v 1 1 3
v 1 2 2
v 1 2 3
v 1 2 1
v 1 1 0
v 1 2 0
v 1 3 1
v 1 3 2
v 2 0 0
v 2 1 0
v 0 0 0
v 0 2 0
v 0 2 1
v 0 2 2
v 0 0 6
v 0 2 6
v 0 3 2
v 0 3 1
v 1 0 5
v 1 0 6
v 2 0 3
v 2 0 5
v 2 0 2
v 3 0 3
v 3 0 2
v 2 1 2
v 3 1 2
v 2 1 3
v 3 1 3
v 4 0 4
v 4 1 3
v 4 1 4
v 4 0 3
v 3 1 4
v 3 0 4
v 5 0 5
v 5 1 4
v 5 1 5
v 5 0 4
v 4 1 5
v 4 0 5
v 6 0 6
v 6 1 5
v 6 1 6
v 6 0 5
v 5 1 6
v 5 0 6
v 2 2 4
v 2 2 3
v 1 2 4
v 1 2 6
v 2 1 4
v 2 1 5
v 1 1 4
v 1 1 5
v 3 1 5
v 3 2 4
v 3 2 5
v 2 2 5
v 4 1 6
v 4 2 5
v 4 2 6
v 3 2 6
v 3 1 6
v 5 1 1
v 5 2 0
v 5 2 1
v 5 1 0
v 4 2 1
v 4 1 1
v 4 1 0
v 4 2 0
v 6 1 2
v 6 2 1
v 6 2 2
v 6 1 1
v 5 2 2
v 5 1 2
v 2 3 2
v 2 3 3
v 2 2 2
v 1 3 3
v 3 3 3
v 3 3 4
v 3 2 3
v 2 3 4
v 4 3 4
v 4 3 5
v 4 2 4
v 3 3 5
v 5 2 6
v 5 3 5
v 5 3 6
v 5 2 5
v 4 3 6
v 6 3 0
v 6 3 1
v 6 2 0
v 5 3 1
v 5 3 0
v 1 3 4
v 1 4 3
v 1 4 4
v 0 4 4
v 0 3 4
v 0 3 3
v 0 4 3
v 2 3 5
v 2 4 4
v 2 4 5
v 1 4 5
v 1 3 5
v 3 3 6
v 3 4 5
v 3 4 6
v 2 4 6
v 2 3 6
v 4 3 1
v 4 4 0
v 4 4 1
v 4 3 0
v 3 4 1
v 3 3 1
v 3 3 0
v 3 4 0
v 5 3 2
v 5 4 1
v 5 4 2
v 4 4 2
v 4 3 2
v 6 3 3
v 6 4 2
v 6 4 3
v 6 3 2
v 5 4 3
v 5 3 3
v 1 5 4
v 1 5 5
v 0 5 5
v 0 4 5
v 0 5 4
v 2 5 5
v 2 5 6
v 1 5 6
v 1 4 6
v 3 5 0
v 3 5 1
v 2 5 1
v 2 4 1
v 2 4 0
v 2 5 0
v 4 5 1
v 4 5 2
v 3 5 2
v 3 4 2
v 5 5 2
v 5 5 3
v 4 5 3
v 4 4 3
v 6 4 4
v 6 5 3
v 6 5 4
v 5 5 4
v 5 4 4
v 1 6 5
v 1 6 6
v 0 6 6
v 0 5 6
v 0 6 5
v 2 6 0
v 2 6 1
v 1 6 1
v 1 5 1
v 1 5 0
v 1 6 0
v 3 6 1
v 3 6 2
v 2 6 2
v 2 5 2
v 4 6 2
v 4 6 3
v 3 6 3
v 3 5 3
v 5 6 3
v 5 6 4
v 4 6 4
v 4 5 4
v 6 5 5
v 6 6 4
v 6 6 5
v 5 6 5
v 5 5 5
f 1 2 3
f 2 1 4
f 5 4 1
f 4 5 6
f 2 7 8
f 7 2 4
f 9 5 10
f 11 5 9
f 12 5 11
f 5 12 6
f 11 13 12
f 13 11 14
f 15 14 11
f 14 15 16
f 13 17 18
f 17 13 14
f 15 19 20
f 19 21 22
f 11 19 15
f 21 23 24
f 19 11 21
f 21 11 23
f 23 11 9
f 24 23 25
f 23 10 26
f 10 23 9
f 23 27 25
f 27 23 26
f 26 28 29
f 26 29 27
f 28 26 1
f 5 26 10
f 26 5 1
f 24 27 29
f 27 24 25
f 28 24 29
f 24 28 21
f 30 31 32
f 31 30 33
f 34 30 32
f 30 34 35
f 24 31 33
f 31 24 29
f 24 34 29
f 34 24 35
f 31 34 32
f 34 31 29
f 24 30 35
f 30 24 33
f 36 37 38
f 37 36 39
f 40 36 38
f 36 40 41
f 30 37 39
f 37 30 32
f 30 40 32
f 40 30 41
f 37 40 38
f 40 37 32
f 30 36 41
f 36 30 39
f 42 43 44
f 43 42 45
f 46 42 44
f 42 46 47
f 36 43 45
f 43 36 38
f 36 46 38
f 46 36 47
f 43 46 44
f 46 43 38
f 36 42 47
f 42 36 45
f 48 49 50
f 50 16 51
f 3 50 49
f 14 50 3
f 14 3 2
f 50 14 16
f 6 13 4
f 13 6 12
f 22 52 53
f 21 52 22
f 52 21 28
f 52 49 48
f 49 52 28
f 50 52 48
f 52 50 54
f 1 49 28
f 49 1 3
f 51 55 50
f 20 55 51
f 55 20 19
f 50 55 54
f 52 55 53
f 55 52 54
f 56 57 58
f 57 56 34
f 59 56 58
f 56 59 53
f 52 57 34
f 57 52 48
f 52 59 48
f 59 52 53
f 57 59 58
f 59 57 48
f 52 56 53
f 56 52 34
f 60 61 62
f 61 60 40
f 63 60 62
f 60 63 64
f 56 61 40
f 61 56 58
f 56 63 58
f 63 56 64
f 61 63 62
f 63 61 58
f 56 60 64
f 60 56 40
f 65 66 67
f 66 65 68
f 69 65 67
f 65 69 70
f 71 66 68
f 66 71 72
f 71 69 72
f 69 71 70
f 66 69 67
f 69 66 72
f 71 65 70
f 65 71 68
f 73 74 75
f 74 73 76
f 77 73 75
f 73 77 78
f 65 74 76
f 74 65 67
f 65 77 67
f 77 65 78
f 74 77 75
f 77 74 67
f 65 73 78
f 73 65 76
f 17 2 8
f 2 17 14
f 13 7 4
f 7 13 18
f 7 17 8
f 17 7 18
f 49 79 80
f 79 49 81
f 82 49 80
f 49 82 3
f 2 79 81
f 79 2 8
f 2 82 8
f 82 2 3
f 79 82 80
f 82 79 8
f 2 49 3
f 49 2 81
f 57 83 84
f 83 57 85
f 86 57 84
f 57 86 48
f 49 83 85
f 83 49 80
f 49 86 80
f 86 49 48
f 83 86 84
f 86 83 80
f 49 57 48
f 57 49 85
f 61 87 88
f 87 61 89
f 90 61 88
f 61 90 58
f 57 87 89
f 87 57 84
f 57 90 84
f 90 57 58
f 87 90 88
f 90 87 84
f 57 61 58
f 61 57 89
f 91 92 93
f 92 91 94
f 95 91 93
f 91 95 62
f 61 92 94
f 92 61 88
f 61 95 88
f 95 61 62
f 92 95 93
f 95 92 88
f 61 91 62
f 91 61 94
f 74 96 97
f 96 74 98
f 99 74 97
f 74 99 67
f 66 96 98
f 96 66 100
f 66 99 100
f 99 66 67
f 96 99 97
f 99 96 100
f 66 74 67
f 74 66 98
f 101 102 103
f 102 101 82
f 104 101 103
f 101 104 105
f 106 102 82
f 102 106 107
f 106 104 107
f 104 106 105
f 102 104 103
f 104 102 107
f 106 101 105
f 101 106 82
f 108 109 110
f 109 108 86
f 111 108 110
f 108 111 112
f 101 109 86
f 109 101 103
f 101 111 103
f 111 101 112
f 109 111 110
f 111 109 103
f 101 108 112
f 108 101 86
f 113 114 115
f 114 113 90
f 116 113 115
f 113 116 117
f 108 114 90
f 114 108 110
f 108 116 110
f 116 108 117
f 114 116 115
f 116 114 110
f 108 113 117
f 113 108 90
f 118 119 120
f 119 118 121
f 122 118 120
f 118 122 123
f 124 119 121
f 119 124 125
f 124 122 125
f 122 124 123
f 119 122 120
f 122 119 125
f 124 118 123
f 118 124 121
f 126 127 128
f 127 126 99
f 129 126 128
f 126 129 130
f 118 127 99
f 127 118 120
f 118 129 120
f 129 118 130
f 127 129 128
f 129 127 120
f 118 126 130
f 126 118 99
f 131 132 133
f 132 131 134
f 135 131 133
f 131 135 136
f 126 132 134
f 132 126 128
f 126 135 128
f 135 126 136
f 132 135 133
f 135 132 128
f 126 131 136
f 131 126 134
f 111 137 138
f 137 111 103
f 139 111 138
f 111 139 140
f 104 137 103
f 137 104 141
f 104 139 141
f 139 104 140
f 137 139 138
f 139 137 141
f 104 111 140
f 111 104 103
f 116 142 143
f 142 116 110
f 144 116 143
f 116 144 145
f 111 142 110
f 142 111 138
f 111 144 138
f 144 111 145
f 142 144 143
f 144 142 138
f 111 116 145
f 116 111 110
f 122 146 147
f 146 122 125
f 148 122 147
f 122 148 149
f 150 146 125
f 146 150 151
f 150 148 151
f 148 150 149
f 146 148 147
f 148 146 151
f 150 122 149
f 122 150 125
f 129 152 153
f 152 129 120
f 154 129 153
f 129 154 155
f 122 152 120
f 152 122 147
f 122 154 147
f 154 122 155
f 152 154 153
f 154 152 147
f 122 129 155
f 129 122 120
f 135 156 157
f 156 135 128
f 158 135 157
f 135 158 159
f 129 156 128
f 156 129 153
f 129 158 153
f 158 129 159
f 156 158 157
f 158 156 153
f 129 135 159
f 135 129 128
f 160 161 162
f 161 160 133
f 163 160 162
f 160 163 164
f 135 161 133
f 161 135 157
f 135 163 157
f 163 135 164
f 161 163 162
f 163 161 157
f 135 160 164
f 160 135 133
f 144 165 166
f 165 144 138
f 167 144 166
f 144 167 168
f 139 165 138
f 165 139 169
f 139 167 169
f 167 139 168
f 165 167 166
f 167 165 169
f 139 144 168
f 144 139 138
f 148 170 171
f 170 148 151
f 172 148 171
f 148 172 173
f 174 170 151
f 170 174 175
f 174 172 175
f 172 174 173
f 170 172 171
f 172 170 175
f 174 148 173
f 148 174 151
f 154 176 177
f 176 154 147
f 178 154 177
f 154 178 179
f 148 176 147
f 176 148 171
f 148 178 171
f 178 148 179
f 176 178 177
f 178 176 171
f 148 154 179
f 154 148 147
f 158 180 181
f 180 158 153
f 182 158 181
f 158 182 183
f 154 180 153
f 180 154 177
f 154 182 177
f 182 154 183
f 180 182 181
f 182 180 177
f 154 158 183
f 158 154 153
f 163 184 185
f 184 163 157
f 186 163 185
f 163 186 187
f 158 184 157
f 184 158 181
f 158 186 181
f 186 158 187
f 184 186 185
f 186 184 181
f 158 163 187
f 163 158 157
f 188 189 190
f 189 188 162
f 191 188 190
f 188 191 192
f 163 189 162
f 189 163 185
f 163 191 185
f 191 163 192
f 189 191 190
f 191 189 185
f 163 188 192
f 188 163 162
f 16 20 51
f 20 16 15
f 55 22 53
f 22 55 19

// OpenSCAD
union() {
    translate([0, 0, 0]) cube([1, 1, 1]);
    translate([1, 0, 1]) cube([1, 1, 1]);
    translate([2, 0, 2]) cube([1, 1, 1]);
    translate([3, 0, 3]) cube([1, 1, 1]);
    translate([4, 0, 4]) cube([1, 1, 1]);
    translate([5, 0, 5]) cube([1, 1, 1]);
    translate([0, 1, 2]) cube([1, 1, 1]);
    translate([1, 1, 3]) cube([1, 1, 1]);
    translate([2, 1, 4]) cube([1, 1, 1]);
    translate([3, 1, 5]) cube([1, 1, 1]);
    translate([4, 1, 0]) cube([1, 1, 1]);
    translate([5, 1, 1]) cube([1, 1, 1]);
    translate([0, 2, 1]) cube([1, 1, 1]);
    translate([1, 2, 2]) cube([1, 1, 1]);
    translate([2, 2, 3]) cube([1, 1, 1]);
    translate([3, 2, 4]) cube([1, 1, 1]);
    translate([4, 2, 5]) cube([1, 1, 1]);
    translate([5, 2, 0]) cube([1, 1, 1]);
    translate([0, 3, 3]) cube([1, 1, 1]);
    translate([1, 3, 4]) cube([1, 1, 1]);
    translate([2, 3, 5]) cube([1, 1, 1]);
    translate([3, 3, 0]) cube([1, 1, 1]);
    translate([4, 3, 1]) cube([1, 1, 1]);
    translate([5, 3, 2]) cube([1, 1, 1]);
    translate([0, 4, 4]) cube([1, 1, 1]);
    translate([1, 4, 5]) cube([1, 1, 1]);
    translate([2, 4, 0]) cube([1, 1, 1]);
    translate([3, 4, 1]) cube([1, 1, 1]);
    translate([4, 4, 2]) cube([1, 1, 1]);
    translate([5, 4, 3]) cube([1, 1, 1]);
    translate([0, 5, 5]) cube([1, 1, 1]);
    translate([1, 5, 0]) cube([1, 1, 1]);
    translate([2, 5, 1]) cube([1, 1, 1]);
    translate([3, 5, 2]) cube([1, 1, 1]);
    translate([4, 5, 3]) cube([1, 1, 1]);
    translate([5, 5, 4]) cube([1, 1, 1]);
    translate([0, 0, 1]) cube([1, 1, 1]);
    translate([0, 0, 2]) cube([1, 1, 1]);
    translate([0, 0, 3]) cube([1, 1, 1]);
    translate([0, 0, 4]) cube([1, 1, 1]);
    translate([0, 0, 5]) cube([1, 1, 1]);
    translate([0, 1, 0]) cube([1, 1, 1]);
    translate([0, 1, 1]) cube([1, 1, 1]);
    translate([0, 1, 3]) cube([1, 1, 1]);
    translate([0, 1, 4]) cube([1, 1, 1]);
    translate([0, 1, 5]) cube([1, 1, 1]);
    translate([1, 0, 0]) cube([1, 1, 1]);
    translate([1, 0, 2]) cube([1, 1, 1]);
    translate([1, 0, 3]) cube([1, 1, 1]);
    translate([1, 0, 4]) cube([1, 1, 1]);
}
